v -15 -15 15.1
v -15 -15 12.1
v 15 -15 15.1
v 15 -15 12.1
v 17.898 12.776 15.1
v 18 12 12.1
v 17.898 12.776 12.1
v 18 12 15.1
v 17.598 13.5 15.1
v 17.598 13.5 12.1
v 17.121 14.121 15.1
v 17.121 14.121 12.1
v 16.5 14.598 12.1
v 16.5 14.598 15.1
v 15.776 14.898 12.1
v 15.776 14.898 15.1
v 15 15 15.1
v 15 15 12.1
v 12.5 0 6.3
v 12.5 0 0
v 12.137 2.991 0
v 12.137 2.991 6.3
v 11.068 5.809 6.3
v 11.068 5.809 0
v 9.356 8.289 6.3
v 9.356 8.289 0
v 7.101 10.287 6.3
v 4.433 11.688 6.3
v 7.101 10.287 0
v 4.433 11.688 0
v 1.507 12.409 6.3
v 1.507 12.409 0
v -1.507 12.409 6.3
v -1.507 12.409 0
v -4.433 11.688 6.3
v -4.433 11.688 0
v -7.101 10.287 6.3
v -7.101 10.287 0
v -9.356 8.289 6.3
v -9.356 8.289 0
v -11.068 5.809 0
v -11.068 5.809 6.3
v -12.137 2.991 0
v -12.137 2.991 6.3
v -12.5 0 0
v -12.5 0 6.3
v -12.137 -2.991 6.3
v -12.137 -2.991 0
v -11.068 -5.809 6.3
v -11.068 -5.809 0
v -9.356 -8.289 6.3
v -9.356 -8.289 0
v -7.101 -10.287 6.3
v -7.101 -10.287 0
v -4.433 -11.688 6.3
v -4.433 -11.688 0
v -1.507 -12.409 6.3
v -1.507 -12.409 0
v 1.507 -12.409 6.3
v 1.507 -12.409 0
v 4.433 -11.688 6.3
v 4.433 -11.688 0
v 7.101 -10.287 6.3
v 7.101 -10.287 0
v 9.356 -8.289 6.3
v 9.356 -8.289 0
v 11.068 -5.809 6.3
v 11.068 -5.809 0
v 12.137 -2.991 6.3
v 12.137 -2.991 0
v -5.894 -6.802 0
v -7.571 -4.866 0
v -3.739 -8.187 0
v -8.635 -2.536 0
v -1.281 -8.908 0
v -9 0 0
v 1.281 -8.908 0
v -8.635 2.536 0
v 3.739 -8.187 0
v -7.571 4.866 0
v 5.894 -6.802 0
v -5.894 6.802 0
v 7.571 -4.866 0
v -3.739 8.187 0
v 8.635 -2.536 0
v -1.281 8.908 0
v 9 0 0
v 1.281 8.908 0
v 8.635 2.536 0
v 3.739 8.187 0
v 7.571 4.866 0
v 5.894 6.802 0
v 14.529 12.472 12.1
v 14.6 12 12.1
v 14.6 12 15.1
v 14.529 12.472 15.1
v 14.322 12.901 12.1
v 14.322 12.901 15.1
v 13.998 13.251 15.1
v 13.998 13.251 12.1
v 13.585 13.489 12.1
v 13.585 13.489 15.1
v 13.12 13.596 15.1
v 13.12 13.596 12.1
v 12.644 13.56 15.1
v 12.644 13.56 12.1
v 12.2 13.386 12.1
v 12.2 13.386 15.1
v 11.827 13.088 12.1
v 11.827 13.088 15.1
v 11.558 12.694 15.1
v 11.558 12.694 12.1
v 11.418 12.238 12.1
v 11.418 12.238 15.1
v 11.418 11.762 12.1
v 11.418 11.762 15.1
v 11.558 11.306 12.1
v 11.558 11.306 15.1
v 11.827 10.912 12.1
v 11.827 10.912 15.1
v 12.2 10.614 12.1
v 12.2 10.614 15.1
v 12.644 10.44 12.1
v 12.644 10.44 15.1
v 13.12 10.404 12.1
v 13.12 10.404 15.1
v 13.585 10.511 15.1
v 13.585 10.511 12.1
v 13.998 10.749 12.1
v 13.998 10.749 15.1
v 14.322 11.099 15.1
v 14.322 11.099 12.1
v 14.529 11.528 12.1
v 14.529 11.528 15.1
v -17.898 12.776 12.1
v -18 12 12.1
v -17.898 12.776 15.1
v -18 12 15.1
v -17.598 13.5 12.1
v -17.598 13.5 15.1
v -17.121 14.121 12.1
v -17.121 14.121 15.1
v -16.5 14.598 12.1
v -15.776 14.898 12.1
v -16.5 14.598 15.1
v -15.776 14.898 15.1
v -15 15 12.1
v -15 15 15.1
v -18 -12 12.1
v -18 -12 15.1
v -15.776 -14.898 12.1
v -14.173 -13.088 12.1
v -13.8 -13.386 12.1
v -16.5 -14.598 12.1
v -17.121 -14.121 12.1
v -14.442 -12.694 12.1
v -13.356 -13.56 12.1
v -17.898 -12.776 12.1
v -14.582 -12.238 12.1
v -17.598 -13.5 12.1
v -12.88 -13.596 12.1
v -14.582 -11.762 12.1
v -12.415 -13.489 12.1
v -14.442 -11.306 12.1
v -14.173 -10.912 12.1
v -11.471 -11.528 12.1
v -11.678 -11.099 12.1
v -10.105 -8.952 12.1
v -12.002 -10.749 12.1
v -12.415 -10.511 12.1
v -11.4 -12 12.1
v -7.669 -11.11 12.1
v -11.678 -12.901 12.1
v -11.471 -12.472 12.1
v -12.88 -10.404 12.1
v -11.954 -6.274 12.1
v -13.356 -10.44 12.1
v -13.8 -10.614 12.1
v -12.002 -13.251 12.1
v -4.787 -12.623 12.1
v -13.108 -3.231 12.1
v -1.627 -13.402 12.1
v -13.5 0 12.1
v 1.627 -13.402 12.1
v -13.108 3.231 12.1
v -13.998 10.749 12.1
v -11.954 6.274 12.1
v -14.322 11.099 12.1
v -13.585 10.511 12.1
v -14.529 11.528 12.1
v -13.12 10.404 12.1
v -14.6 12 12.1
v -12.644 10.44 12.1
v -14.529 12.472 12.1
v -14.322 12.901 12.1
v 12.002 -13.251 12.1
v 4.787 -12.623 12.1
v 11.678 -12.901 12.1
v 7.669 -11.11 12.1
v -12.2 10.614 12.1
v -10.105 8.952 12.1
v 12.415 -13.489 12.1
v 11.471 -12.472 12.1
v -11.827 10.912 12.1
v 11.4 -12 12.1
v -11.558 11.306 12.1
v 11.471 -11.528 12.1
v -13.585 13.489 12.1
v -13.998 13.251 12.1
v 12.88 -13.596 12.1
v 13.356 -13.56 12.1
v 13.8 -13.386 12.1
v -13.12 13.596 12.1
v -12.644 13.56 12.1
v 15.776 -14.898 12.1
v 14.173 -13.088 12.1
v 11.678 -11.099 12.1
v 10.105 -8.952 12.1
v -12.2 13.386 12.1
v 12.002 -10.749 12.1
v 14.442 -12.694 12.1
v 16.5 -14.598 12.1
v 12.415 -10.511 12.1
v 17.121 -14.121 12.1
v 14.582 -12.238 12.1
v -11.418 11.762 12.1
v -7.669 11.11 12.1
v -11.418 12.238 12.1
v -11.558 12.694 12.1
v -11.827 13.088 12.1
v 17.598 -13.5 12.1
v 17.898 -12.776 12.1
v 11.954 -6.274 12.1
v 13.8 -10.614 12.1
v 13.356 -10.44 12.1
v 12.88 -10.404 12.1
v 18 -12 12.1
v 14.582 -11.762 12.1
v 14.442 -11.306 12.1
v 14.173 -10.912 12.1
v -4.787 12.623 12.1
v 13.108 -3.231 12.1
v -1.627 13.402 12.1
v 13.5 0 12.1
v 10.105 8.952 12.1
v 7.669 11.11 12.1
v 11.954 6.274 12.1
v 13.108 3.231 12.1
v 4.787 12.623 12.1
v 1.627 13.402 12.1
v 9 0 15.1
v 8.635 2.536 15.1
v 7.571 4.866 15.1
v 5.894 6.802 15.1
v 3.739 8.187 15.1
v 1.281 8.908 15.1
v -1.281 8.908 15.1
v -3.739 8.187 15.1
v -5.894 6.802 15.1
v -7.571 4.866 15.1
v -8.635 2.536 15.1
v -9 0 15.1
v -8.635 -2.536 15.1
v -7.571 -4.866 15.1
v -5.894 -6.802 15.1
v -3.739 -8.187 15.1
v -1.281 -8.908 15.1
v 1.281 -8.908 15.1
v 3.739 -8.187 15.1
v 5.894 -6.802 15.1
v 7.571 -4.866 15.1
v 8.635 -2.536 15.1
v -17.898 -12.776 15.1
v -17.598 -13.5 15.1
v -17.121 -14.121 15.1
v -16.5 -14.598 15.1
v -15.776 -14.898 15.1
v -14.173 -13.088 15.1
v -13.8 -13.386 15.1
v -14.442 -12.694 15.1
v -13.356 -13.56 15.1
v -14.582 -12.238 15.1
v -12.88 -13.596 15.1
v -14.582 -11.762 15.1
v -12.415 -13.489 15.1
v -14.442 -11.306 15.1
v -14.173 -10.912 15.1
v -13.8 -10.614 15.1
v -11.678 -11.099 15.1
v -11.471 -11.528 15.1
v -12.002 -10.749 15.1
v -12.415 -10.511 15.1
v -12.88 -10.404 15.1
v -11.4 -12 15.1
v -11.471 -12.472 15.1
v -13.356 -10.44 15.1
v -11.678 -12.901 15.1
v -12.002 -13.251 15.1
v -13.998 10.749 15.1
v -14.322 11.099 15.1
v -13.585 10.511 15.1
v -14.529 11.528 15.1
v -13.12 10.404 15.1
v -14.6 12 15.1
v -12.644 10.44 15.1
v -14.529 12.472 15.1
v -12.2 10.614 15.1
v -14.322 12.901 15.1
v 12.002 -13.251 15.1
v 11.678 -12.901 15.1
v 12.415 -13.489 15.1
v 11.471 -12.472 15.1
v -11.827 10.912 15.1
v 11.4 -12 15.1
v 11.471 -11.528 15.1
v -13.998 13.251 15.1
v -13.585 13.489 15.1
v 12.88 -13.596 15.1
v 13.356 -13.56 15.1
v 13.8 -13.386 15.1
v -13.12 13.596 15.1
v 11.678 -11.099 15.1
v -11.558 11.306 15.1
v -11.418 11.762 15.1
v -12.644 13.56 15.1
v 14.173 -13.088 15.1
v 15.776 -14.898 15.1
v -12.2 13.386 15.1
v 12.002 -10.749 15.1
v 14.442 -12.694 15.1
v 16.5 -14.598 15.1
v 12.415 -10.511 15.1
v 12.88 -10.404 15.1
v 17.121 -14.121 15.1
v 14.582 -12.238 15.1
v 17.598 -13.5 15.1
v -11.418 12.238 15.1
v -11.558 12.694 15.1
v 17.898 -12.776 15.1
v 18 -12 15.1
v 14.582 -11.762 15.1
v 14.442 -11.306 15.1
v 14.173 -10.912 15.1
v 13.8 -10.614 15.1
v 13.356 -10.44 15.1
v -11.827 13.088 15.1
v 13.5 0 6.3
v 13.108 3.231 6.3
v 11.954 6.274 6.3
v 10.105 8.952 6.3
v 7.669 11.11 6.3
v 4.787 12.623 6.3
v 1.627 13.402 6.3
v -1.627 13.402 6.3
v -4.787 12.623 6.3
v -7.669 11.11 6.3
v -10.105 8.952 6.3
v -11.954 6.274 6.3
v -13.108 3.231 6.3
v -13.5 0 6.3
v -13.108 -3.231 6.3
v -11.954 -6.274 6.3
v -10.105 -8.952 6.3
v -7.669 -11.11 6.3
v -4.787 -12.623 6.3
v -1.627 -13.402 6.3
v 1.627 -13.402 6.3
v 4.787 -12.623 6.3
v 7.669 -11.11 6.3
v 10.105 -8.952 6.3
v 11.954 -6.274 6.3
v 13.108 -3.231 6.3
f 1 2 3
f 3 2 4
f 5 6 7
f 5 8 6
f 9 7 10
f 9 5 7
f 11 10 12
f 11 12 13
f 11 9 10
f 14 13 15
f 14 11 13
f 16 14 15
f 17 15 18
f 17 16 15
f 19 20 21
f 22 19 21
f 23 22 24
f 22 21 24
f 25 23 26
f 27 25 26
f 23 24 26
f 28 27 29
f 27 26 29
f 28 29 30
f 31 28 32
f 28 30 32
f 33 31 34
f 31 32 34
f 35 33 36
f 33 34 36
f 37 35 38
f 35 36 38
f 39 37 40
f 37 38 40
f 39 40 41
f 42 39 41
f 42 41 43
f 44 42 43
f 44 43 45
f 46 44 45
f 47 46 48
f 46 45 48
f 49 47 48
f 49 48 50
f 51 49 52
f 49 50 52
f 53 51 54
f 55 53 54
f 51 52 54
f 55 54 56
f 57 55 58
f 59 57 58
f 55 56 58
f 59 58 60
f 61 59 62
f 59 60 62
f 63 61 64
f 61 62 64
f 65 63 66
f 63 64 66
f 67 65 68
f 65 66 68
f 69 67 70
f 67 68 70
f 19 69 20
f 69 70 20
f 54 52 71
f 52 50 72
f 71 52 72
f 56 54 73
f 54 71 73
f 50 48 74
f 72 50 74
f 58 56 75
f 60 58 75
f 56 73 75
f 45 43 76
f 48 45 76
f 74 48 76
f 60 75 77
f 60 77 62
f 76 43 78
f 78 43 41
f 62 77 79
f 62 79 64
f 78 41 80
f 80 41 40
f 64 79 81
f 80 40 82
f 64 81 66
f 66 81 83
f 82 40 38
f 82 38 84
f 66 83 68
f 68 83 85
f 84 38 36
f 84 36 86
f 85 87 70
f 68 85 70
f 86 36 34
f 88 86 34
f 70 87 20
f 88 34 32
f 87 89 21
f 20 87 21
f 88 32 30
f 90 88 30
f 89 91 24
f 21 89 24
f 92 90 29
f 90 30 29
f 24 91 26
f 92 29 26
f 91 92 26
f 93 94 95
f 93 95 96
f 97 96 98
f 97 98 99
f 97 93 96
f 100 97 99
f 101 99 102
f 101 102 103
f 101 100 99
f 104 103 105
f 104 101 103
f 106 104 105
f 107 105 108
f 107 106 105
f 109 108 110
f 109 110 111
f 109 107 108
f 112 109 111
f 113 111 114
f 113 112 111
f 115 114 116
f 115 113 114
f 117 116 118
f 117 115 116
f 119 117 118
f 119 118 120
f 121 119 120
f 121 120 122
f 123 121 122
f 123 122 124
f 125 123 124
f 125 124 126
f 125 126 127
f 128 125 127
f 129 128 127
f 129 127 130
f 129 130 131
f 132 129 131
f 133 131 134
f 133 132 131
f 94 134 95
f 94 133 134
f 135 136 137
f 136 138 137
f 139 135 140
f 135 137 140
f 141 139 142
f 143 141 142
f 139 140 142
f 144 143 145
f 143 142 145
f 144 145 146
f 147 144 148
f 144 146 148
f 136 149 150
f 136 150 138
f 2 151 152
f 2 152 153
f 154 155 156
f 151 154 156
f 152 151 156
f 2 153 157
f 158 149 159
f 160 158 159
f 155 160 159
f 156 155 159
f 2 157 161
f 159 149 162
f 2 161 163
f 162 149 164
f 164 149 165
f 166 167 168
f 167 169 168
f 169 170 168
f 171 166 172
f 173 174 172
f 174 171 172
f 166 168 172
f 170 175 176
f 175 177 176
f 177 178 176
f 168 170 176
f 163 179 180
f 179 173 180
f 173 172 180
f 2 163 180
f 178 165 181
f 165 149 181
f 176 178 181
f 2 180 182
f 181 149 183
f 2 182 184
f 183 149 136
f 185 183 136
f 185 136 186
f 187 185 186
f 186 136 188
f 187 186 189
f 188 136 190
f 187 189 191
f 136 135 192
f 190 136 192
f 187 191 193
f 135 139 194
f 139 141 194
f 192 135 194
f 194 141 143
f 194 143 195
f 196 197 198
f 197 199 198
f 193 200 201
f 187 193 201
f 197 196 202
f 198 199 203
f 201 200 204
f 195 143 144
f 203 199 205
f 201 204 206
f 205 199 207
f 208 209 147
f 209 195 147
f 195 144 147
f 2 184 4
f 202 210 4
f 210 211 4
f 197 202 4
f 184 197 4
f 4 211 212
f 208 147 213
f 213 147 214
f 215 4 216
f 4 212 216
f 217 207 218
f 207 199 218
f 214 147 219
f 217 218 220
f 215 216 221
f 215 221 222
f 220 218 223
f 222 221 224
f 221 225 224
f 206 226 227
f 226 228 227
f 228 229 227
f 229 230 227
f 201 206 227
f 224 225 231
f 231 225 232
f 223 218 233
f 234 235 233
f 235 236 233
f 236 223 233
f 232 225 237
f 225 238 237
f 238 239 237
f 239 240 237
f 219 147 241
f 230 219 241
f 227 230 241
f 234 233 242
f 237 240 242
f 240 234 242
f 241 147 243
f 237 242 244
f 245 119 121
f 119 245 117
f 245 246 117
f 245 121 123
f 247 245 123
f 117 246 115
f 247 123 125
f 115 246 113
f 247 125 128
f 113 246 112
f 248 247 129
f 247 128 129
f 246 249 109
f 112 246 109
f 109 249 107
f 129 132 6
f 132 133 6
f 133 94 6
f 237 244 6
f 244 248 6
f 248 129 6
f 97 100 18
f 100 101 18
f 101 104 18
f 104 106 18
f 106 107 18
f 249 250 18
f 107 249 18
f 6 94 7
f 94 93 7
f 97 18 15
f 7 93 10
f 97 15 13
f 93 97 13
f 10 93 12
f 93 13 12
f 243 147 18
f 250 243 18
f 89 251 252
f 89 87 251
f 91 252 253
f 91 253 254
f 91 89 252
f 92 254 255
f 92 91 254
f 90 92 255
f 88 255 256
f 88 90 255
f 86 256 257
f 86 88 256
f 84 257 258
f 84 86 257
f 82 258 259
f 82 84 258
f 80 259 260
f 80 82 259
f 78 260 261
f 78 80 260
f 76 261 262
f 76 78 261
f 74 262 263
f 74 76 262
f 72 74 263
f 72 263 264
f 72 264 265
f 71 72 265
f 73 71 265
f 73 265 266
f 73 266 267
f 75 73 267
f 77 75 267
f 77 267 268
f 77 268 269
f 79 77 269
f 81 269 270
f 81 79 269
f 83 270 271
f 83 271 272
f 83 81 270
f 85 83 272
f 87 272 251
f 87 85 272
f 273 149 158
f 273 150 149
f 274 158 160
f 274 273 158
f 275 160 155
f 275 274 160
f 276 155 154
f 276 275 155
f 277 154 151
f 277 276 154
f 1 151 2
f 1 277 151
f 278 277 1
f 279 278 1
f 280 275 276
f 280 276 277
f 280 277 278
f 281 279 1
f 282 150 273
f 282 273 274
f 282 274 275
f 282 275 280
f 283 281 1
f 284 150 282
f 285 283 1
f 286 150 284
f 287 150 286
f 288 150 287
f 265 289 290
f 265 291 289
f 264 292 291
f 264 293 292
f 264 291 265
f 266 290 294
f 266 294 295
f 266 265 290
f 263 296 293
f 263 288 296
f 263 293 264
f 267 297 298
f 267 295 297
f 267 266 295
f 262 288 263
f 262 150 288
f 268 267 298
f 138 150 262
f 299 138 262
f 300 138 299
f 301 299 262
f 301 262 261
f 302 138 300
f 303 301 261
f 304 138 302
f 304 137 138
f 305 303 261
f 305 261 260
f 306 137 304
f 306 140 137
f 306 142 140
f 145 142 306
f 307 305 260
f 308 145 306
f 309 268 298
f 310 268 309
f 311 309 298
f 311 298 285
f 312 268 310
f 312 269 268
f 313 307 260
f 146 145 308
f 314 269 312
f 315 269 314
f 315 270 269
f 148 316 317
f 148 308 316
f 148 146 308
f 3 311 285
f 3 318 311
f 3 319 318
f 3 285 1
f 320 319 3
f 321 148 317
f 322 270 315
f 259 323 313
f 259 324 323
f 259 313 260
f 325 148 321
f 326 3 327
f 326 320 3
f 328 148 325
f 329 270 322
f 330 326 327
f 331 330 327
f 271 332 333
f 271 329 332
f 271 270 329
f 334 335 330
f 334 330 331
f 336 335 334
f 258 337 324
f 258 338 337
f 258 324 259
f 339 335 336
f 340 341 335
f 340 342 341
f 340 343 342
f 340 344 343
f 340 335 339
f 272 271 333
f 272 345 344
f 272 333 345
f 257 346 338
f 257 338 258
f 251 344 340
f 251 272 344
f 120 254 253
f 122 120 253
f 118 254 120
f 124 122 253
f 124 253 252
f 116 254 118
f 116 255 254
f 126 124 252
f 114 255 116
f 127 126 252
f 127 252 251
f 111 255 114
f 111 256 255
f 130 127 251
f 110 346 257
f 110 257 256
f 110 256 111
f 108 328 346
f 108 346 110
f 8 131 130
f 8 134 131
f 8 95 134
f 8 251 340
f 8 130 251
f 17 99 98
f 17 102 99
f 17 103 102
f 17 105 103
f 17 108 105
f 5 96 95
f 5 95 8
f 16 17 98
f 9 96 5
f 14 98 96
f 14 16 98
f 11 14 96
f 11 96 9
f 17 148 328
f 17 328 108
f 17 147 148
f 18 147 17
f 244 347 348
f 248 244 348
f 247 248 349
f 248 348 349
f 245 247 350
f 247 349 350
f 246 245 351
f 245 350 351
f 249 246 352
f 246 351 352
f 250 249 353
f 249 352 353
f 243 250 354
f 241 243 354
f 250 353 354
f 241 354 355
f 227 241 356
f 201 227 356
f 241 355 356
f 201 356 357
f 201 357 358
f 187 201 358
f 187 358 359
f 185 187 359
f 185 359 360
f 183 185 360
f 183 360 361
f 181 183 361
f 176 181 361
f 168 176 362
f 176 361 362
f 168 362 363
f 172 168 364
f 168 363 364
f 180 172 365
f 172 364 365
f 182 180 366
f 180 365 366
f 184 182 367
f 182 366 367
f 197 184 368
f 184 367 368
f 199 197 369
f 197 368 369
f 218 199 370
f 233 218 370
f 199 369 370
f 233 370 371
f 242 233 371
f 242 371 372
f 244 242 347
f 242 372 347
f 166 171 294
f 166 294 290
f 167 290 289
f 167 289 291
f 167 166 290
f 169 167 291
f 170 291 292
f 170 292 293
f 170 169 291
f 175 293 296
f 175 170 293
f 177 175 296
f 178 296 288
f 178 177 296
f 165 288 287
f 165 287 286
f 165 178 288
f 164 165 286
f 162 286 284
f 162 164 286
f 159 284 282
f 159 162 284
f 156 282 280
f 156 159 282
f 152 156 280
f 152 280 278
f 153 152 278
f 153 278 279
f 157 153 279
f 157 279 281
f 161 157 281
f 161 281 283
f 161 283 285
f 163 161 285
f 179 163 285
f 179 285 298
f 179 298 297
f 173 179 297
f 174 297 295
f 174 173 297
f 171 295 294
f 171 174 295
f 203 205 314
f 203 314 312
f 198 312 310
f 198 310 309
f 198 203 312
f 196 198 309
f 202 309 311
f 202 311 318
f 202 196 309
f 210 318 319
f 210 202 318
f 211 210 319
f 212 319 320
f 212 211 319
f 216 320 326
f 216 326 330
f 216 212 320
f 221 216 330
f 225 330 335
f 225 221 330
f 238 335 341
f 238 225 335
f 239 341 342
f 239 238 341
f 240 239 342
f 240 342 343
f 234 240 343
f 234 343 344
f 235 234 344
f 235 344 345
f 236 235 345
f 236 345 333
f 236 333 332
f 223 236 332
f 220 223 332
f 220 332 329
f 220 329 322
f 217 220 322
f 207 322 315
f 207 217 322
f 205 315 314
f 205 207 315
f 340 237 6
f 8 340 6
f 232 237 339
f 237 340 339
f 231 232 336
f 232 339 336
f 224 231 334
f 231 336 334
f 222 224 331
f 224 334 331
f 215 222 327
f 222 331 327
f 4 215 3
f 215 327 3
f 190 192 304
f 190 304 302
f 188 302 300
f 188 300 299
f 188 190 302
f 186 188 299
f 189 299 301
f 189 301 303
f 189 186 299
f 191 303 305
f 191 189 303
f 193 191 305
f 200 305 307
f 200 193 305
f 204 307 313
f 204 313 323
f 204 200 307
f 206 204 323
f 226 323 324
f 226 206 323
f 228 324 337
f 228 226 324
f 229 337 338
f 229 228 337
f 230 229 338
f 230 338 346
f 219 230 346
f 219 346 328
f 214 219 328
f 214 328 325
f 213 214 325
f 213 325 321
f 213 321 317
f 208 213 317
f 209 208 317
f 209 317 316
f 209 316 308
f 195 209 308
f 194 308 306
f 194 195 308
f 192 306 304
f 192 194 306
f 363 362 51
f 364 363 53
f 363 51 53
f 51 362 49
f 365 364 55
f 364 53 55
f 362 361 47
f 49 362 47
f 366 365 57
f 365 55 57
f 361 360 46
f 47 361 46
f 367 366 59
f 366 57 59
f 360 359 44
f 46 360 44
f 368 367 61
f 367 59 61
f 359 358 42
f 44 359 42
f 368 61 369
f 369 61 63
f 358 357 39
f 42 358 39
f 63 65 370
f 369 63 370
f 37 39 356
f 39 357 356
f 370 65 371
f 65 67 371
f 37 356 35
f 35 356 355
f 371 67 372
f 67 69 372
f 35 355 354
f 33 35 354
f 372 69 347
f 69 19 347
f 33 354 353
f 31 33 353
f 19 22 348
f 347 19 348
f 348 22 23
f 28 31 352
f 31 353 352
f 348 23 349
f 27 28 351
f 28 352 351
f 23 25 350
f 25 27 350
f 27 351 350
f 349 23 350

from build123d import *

# Parameters (mm, degrees)
SKETCH_1_R      = 12.5
SKETCH_1_R_2    = 9
EXTRUDE_1_DEPTH = 6.3
SKETCH_2_R      = 13.5
SKETCH_2_R_2    = 9
EXTRUDE_2_DEPTH = 5.8
SKETCH_3_W      = 36
SKETCH_3_H      = 30
SKETCH_3_R      = 9
SKETCH_3_R_2    = 1.6
EXTRUDE_3_DEPTH = 3
FILLET_1_R      = 3


with BuildPart() as part:
    # 草图1 → 凸台-拉伸1 (new body)
    with BuildSketch(Plane.XY):
        Circle(SKETCH_1_R)
        Circle(SKETCH_1_R_2, mode=Mode.SUBTRACT)
    extrude(amount=EXTRUDE_1_DEPTH)

    # 草图2 → 凸台-拉伸2 (add)
    with BuildSketch(Plane.XY.offset(6.3)):
        Circle(SKETCH_2_R)
        Circle(SKETCH_2_R_2, mode=Mode.SUBTRACT)
    extrude(amount=EXTRUDE_2_DEPTH)

    # 草图3 → 凸台-拉伸3 (add)
    with BuildSketch(Plane.XY.offset(12.1)):
        Rectangle(SKETCH_3_W, SKETCH_3_H)
        Circle(SKETCH_3_R, mode=Mode.SUBTRACT)
        with Locations((13, 12)):
            Circle(SKETCH_3_R_2, mode=Mode.SUBTRACT)
        with Locations(Location((13, -12, 0), (0, 0, 180))):
            Circle(SKETCH_3_R_2, mode=Mode.SUBTRACT)
        with Locations((-13, -12)):
            Circle(SKETCH_3_R_2, mode=Mode.SUBTRACT)
        with Locations(Location((-13, 12, 0), (0, 0, 180))):
            Circle(SKETCH_3_R_2, mode=Mode.SUBTRACT)
    extrude(amount=EXTRUDE_3_DEPTH)

    # 圆角1
    fillet_1_edges = [part.edges().sort_by_distance(p)[0] for p in [
        (18, 15, 13.6),
        (-18, 15, 13.6),
        (-18, -15, 13.6),
        (18, -15, 13.6),
    ]]
    fillet(fillet_1_edges, radius=FILLET_1_R)


solid = part.part
